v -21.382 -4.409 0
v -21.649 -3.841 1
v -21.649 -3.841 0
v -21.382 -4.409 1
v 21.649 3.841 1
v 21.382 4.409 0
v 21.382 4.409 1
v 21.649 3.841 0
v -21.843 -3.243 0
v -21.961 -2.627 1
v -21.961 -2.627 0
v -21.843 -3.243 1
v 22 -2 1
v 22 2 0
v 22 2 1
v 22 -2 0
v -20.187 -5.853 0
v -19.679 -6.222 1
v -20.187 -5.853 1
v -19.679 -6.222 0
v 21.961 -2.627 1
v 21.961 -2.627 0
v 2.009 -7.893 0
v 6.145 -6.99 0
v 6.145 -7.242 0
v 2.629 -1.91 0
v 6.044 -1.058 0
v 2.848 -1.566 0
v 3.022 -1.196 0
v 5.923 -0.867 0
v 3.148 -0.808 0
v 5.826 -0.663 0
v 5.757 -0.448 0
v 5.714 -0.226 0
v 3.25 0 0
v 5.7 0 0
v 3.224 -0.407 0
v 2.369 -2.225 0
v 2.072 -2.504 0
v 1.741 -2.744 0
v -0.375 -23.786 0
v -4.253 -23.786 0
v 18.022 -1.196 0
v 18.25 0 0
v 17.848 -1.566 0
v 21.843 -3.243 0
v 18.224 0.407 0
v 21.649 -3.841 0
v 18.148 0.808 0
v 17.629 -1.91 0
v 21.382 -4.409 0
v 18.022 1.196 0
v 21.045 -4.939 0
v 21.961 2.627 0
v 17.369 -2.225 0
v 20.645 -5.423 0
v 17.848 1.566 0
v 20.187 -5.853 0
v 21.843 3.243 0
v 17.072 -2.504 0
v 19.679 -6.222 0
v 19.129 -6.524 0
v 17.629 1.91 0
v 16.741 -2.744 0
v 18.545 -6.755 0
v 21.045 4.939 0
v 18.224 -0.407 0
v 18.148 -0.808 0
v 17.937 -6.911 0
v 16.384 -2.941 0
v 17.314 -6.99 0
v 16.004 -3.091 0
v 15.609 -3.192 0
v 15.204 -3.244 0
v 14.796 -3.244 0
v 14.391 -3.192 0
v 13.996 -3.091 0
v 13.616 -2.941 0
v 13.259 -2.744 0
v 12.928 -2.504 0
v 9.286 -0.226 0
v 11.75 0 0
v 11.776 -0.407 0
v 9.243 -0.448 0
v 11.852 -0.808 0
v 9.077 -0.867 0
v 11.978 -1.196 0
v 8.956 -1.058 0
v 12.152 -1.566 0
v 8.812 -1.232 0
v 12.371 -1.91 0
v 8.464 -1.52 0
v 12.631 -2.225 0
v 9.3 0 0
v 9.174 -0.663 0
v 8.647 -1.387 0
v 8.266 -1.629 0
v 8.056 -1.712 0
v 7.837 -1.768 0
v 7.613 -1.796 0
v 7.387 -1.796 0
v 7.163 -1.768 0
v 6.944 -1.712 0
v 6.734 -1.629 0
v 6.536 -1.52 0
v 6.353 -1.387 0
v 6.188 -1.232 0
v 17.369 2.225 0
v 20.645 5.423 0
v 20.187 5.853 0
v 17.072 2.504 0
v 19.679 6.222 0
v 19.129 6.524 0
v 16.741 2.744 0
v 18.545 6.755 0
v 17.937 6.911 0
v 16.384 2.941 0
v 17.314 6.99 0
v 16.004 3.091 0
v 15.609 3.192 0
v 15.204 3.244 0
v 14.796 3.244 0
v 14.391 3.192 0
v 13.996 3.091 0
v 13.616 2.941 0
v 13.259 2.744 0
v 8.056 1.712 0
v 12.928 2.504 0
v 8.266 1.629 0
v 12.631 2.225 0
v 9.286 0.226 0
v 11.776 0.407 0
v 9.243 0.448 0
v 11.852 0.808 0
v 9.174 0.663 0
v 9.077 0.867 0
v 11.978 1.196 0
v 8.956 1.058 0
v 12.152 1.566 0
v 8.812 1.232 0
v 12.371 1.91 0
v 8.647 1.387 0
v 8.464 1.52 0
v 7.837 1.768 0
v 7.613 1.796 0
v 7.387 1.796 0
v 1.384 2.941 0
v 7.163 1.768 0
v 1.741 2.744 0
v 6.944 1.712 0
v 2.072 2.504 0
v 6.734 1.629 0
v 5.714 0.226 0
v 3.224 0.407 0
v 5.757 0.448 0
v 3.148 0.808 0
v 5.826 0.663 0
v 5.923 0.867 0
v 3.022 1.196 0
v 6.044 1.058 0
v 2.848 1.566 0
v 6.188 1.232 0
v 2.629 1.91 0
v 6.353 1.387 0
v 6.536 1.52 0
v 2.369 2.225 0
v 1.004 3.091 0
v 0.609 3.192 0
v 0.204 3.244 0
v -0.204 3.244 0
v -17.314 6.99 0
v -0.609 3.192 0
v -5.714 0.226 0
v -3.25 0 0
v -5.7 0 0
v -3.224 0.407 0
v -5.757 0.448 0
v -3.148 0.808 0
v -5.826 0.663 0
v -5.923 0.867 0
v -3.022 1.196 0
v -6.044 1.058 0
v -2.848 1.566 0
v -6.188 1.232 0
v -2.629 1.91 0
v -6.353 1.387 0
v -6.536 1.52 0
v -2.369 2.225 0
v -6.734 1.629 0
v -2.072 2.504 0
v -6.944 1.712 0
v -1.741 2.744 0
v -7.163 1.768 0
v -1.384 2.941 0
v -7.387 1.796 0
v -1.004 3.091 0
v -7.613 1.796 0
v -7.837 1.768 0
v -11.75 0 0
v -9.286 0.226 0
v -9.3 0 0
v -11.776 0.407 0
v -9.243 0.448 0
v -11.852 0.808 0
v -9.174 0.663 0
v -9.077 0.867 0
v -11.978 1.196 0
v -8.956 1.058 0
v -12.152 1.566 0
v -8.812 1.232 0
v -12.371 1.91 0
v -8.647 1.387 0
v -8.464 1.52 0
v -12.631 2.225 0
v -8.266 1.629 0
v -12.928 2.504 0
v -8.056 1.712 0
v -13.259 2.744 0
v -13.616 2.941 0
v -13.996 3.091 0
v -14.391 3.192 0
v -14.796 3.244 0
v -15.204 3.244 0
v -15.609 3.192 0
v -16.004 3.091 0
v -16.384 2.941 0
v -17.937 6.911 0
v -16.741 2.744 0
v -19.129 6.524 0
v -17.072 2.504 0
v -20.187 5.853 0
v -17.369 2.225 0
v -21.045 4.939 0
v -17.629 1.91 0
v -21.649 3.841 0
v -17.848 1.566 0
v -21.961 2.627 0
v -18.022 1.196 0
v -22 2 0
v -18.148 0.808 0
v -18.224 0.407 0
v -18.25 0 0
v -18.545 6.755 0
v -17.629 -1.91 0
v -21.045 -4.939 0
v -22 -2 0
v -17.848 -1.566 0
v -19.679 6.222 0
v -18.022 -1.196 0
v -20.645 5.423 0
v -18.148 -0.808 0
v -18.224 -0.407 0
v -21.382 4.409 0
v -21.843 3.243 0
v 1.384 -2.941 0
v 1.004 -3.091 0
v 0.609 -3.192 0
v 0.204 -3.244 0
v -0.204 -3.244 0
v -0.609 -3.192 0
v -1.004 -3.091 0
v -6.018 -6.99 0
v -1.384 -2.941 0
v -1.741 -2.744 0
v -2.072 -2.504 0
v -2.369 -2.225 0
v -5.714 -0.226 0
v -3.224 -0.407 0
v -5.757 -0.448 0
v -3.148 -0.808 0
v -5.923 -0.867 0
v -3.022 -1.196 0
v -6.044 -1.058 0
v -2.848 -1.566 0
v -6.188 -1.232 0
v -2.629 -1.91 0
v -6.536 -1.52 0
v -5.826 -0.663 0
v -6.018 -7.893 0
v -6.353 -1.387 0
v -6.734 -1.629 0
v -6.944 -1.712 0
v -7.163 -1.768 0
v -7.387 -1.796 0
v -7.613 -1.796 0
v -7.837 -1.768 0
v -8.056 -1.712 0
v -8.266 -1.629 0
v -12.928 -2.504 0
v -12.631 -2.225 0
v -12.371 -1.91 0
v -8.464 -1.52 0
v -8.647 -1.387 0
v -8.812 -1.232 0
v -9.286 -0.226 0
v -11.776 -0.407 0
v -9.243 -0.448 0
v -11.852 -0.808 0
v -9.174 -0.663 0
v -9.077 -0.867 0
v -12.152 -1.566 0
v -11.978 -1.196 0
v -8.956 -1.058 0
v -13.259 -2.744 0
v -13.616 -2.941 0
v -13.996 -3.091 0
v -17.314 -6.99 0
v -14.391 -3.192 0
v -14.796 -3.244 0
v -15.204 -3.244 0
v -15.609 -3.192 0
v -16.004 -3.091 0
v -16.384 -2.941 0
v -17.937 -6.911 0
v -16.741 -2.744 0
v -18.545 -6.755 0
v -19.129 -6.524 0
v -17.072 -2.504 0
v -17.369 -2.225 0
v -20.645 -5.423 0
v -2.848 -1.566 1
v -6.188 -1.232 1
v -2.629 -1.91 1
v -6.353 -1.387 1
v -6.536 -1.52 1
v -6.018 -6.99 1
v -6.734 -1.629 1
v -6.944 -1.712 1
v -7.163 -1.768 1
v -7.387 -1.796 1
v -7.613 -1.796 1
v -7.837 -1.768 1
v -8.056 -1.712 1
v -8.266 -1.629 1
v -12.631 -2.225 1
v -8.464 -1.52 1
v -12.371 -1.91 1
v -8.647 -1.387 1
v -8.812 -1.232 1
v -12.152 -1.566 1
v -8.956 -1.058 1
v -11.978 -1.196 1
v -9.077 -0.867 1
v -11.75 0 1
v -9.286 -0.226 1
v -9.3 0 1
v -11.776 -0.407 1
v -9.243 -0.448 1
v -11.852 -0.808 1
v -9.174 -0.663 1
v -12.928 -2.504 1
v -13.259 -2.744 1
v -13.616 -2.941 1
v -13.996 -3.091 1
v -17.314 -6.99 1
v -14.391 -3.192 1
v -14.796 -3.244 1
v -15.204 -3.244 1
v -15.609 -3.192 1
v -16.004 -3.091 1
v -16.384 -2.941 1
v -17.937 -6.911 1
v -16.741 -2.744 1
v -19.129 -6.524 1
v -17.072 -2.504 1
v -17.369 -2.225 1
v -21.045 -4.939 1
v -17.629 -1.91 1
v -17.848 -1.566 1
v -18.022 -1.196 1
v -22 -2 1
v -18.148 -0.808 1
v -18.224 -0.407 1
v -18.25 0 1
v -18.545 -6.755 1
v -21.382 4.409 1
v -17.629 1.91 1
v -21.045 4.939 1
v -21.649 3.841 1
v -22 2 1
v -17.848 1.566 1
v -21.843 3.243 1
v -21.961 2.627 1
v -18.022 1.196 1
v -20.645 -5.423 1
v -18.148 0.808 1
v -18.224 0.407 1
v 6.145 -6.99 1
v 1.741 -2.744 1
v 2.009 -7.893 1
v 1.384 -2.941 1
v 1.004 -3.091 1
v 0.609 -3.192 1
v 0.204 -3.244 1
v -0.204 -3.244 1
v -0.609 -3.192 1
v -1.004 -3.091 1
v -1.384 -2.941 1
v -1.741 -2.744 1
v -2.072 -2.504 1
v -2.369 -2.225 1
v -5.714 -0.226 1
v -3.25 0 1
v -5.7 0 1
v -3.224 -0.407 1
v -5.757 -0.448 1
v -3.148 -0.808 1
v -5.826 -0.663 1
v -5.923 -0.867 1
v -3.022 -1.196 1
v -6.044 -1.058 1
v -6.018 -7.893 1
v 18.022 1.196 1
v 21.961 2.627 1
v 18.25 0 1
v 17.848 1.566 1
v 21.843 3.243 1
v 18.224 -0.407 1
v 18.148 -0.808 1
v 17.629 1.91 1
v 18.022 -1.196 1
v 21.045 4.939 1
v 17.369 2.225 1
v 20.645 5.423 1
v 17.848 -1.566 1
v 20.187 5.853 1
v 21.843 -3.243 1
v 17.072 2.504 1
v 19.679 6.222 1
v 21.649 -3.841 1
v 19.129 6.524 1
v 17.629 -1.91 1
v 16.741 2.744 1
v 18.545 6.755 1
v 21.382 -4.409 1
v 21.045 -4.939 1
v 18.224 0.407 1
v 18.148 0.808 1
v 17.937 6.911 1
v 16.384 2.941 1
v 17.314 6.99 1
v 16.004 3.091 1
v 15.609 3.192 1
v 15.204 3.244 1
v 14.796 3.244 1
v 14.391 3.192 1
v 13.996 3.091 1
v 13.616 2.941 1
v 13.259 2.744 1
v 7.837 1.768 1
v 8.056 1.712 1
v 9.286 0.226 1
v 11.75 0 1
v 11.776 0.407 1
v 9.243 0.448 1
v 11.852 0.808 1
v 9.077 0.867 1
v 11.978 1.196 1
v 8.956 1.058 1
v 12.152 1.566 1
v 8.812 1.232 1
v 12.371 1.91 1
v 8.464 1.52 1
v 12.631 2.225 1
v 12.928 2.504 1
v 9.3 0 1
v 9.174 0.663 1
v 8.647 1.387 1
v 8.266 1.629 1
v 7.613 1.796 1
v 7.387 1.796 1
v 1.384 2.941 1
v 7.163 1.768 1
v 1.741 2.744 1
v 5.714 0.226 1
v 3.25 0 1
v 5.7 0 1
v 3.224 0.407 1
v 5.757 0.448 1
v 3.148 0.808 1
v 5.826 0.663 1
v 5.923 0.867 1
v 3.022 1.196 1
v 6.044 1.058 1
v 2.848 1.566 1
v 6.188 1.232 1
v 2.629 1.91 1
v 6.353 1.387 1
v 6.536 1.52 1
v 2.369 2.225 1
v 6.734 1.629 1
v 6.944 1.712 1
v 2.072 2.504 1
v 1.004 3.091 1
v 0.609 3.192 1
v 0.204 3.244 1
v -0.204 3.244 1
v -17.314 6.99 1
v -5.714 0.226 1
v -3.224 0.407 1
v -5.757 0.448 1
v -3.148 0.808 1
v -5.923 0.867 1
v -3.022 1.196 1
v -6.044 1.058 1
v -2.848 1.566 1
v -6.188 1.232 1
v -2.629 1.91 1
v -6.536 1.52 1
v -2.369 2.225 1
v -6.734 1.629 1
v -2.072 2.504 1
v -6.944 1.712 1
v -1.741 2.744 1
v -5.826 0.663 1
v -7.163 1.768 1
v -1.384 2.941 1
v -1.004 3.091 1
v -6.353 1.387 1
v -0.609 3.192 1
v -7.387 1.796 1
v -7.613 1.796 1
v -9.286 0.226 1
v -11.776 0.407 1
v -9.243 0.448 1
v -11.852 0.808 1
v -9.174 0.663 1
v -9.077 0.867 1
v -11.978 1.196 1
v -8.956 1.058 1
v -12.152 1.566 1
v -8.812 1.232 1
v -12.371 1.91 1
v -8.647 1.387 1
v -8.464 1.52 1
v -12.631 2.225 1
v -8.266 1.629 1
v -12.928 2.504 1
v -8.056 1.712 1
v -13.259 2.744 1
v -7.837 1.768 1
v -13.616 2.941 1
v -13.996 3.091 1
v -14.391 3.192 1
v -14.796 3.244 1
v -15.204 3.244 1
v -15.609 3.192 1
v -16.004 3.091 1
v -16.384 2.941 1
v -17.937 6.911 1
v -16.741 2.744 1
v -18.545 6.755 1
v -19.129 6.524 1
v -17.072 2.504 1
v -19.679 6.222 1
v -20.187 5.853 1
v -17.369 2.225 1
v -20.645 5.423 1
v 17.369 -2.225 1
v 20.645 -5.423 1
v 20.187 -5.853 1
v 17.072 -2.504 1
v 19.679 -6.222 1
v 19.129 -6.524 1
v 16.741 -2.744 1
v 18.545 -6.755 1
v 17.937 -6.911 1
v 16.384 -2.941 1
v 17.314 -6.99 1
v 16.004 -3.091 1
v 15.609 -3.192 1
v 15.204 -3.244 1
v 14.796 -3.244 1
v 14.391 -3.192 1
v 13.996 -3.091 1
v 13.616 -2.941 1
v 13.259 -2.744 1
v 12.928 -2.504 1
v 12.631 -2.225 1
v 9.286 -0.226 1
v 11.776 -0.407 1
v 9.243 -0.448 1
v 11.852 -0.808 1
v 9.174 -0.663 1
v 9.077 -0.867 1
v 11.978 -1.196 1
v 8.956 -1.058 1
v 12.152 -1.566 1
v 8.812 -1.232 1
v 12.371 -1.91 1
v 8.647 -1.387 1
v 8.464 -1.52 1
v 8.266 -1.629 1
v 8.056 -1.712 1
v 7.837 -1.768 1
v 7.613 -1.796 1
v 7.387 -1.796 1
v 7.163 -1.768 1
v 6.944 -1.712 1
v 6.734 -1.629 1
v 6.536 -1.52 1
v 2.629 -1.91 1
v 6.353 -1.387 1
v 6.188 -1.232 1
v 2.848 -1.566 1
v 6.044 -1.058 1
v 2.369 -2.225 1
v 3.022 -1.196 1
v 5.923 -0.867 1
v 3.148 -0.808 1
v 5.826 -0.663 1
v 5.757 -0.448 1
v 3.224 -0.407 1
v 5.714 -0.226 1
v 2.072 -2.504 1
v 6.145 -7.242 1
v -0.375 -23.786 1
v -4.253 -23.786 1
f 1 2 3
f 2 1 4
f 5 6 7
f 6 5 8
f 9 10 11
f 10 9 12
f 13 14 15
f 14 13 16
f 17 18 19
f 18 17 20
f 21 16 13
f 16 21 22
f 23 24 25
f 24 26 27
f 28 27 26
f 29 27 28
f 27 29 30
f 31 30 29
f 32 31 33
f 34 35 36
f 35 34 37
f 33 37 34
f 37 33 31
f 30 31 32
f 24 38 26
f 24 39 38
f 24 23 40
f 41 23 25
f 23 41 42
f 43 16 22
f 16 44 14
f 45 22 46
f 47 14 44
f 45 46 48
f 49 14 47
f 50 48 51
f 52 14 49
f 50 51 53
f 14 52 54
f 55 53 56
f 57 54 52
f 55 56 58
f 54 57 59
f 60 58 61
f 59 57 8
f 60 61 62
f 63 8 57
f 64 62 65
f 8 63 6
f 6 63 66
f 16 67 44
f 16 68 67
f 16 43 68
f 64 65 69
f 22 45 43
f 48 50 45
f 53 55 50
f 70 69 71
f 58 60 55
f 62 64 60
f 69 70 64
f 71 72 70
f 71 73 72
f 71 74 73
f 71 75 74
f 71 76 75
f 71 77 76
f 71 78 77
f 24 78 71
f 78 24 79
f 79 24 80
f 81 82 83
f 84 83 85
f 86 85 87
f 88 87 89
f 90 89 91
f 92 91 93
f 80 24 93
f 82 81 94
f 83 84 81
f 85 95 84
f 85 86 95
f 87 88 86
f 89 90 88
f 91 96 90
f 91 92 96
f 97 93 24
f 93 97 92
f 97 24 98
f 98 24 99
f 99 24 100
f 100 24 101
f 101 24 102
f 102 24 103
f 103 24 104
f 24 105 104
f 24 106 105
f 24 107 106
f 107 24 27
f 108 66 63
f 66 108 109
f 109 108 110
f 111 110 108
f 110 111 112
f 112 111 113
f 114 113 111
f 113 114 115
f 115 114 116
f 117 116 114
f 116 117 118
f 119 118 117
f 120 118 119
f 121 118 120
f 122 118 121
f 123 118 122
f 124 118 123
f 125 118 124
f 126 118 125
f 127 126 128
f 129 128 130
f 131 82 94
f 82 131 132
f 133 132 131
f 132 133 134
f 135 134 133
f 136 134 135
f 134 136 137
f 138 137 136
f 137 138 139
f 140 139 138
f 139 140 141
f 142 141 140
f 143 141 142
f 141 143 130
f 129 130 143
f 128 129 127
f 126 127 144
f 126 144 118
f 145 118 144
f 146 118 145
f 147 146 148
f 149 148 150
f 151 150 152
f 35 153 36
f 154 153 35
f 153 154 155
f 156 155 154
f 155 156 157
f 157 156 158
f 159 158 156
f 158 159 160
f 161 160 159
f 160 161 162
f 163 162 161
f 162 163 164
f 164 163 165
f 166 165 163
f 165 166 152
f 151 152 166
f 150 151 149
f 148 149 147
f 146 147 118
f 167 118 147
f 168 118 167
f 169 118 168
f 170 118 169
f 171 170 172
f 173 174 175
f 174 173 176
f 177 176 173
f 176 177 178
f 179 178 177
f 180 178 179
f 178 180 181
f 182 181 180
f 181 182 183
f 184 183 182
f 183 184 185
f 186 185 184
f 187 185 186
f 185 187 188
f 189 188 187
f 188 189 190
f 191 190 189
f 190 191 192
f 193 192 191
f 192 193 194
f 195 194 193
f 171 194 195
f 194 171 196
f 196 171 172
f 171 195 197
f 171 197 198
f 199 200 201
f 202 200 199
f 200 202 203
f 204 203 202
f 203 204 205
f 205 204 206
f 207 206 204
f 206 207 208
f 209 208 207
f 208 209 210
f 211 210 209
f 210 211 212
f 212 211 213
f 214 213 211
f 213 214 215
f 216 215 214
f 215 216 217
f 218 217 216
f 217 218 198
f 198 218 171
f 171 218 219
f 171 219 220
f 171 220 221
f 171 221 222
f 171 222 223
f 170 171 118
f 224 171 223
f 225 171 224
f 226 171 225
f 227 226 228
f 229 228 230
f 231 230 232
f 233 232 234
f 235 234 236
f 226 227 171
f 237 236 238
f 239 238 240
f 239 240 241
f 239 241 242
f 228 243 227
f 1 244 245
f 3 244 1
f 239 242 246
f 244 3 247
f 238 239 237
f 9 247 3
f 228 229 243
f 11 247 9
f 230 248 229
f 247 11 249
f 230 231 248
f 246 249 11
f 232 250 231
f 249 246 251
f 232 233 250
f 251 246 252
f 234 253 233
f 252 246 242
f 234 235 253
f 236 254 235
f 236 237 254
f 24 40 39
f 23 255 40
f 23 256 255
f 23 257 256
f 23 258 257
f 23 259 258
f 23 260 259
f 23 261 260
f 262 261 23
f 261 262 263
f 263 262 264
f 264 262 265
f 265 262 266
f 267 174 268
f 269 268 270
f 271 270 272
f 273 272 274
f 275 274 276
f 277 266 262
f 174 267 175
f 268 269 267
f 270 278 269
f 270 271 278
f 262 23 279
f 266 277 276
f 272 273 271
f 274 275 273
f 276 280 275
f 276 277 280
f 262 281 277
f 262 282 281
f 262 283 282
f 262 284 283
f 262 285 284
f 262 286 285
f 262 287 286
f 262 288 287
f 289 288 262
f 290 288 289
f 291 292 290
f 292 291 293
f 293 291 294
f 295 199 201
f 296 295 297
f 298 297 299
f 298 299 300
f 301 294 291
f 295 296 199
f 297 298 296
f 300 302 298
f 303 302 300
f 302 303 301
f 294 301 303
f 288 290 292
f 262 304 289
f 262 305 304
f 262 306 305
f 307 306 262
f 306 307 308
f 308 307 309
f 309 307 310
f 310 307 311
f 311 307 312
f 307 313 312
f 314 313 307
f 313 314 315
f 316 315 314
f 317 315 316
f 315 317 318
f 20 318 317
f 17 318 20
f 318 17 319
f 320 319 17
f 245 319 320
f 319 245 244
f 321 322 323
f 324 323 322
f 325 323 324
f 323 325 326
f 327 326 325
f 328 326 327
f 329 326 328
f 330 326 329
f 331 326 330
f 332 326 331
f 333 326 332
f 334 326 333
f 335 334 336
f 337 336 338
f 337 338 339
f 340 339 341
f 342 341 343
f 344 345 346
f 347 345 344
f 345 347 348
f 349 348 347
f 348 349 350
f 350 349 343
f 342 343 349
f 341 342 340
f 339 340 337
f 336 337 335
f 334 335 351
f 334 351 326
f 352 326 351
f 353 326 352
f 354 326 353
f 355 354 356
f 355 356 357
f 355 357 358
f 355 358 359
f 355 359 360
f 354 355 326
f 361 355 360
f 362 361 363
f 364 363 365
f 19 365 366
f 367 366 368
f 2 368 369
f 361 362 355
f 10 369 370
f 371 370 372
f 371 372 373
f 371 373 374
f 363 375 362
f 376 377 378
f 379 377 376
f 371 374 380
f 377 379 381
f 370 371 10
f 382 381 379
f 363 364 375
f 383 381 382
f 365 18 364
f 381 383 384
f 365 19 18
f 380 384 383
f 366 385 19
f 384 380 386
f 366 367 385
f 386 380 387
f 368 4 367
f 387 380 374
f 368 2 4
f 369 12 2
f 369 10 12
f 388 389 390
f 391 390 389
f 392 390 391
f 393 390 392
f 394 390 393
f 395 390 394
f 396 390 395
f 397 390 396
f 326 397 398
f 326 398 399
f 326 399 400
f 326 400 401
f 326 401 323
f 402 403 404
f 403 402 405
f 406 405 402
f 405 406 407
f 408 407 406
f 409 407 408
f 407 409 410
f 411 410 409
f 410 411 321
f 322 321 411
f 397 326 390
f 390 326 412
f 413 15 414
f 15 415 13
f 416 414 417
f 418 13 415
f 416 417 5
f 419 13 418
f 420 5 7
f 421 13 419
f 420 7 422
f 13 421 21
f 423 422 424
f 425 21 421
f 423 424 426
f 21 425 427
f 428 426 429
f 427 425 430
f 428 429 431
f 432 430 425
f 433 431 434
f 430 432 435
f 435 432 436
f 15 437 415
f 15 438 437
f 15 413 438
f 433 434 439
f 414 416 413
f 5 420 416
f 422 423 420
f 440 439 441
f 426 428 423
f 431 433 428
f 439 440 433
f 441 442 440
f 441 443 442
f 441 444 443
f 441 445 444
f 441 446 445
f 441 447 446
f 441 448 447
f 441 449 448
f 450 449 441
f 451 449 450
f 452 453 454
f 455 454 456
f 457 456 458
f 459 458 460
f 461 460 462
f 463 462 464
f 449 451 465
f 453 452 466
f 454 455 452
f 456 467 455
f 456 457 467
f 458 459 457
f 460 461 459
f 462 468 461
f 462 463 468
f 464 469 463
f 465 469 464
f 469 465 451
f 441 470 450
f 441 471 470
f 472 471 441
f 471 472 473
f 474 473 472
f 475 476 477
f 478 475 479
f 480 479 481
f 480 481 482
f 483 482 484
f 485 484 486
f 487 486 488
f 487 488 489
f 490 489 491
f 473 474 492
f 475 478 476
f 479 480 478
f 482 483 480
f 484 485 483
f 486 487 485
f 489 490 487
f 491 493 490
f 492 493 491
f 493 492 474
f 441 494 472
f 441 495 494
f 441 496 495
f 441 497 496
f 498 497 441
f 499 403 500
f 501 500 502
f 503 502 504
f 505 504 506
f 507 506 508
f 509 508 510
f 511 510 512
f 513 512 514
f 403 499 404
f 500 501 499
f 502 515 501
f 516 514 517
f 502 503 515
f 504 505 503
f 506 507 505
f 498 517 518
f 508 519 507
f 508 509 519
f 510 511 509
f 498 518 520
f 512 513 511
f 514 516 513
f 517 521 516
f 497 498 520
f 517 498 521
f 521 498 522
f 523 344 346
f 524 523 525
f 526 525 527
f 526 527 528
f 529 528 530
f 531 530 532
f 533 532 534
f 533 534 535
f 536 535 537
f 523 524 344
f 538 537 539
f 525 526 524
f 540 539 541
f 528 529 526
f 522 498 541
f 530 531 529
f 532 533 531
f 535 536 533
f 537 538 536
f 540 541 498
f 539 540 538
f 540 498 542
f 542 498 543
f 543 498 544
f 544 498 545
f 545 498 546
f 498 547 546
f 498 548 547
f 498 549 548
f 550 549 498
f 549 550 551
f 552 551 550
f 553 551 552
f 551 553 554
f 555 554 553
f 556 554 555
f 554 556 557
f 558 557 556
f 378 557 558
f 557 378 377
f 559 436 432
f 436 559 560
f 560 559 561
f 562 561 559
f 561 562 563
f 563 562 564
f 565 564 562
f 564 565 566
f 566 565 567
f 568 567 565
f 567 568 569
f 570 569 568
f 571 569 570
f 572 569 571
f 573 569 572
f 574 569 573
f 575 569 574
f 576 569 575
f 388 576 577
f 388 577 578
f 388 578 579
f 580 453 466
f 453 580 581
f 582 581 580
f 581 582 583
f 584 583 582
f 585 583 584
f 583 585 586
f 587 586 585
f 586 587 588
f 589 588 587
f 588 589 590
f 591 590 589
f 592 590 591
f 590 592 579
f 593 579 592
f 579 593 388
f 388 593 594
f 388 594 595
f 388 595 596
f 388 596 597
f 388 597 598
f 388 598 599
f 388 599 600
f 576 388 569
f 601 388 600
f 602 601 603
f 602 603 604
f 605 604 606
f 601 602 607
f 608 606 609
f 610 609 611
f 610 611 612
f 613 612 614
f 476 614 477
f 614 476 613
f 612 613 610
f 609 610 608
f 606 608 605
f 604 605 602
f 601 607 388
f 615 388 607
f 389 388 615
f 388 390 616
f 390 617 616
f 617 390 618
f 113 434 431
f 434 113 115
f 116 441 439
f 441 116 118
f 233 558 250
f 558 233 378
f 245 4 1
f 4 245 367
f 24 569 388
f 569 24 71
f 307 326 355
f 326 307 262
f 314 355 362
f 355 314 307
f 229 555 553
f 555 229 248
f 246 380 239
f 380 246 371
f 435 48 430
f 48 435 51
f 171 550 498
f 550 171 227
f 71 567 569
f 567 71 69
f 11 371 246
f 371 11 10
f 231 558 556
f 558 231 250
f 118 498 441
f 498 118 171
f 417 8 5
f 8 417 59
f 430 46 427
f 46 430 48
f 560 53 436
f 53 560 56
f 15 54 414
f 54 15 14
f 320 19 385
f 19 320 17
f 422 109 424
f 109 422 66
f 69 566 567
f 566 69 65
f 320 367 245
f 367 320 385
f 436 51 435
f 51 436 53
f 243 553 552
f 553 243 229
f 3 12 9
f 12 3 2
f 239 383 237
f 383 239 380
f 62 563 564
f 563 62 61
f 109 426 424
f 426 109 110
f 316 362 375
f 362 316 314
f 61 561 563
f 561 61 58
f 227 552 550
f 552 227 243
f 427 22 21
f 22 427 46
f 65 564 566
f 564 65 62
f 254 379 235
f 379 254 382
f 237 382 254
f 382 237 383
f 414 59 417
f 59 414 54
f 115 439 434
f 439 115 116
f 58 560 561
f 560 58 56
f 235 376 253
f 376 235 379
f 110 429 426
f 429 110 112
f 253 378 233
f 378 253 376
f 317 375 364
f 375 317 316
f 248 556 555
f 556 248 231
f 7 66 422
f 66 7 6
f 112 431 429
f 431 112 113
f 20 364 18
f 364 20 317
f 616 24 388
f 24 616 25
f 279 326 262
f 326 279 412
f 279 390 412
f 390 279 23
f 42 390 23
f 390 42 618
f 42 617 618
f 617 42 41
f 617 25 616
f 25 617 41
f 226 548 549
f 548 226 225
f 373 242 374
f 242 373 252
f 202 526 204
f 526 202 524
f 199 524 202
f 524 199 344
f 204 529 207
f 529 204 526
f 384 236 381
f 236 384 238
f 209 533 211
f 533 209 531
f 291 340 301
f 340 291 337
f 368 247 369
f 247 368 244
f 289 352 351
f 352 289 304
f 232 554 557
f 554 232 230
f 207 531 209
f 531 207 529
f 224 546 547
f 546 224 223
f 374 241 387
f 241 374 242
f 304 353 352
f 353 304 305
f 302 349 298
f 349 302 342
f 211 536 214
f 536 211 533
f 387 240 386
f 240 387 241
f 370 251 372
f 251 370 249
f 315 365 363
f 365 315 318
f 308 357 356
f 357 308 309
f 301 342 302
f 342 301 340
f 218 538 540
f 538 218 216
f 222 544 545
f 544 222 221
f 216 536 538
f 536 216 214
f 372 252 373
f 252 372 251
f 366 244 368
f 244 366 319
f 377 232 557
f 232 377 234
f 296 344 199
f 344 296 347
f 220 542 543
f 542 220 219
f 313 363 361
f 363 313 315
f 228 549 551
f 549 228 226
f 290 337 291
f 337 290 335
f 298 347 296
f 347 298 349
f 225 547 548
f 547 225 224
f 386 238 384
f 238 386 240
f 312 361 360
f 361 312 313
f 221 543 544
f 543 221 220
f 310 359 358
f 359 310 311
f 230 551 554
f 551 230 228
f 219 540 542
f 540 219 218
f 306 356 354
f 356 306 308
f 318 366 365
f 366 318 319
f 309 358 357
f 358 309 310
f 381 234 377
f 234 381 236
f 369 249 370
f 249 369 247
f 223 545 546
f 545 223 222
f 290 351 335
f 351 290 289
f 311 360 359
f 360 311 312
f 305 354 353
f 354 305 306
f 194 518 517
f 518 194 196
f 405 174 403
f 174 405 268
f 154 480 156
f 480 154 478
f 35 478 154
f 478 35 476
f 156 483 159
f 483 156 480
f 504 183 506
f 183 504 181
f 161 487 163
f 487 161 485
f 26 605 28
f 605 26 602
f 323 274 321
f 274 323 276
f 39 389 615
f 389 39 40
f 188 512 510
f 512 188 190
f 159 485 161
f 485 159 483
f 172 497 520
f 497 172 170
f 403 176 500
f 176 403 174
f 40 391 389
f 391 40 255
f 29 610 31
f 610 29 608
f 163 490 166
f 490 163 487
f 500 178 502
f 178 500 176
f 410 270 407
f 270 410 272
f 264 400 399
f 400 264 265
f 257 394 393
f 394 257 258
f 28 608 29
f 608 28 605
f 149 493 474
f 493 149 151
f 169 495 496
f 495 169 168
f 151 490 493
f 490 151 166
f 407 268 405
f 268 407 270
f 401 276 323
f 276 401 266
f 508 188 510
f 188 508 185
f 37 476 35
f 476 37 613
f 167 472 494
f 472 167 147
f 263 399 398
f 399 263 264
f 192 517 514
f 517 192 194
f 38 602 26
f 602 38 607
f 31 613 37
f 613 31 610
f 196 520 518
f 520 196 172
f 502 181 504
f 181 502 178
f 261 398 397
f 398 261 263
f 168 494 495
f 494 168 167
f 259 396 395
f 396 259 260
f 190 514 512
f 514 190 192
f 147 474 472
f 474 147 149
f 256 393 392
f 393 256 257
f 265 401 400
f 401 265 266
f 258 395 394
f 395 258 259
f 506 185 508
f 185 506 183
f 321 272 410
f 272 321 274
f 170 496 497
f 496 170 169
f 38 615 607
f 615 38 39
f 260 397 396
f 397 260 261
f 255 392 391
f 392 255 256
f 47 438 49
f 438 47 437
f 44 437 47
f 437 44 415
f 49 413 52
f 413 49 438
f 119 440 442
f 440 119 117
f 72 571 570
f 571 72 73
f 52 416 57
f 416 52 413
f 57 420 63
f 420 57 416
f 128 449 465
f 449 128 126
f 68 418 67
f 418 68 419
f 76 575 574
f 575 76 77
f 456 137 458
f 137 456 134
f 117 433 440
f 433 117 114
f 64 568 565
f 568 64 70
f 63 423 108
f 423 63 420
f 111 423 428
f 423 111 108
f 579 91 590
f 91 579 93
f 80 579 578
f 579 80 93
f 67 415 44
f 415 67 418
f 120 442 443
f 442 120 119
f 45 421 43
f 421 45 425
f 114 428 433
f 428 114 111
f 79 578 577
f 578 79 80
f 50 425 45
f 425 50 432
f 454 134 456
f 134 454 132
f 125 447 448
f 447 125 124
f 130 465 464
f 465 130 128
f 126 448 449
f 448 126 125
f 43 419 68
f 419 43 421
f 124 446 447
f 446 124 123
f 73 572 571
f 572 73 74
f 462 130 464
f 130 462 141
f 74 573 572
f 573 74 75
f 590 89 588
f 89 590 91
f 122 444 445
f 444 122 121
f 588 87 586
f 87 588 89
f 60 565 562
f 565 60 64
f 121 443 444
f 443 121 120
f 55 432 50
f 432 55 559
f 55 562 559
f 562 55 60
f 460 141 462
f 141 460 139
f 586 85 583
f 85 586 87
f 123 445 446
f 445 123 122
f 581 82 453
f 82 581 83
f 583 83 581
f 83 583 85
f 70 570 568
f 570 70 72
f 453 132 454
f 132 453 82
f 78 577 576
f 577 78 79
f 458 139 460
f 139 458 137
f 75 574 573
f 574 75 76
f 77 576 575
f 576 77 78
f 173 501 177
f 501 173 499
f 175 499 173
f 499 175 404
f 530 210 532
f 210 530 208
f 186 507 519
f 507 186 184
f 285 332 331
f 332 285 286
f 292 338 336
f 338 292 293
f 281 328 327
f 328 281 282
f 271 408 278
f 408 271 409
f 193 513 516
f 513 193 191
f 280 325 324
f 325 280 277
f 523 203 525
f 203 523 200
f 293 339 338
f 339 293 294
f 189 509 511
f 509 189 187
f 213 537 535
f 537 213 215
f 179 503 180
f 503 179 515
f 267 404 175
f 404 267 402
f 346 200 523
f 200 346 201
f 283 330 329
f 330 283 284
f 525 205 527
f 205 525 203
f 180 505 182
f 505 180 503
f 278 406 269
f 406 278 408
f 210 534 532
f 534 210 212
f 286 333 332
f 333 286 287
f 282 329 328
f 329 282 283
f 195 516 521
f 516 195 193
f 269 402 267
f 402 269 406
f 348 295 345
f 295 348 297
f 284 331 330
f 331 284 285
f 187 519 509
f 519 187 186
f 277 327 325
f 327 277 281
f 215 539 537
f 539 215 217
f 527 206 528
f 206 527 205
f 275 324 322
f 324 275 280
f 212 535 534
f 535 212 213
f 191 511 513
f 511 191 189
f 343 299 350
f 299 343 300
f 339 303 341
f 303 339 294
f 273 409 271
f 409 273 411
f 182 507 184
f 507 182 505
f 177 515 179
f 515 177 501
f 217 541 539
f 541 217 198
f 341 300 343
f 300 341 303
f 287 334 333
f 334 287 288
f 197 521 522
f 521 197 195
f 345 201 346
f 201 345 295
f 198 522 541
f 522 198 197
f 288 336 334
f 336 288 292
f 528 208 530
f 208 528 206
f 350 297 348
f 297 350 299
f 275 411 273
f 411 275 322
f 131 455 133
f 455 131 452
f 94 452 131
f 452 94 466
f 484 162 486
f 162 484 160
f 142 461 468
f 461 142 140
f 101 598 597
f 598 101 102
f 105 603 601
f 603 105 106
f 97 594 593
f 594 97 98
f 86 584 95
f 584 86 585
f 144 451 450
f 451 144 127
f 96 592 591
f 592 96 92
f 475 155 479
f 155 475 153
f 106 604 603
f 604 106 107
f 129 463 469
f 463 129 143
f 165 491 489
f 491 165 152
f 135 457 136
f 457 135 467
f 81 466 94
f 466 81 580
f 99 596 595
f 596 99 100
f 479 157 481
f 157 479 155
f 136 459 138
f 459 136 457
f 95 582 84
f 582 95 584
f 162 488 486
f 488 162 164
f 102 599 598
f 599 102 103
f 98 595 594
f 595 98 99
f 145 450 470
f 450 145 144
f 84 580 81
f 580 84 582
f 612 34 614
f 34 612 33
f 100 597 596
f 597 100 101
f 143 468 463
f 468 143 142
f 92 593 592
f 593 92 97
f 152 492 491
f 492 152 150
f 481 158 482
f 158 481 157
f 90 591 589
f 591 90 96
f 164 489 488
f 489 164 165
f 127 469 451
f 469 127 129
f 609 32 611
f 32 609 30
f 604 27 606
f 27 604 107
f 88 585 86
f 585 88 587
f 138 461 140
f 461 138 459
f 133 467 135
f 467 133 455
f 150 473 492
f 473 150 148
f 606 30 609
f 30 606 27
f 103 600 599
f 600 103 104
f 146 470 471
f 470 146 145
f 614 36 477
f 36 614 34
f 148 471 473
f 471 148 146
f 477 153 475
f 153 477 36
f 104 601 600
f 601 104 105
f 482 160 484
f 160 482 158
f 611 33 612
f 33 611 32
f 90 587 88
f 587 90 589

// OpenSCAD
$fn = 50;


difference() {
	union() {
		*color(alpha = 1.0000000000, c = "gray") {
			translate(v = [0, 14, 0]) {
				linear_extrude(height = 1) {
					text(font = "Arial:style=Bold", halign = "center", size = 4.5000000000, text = "COMMENT description oobb_plate_shape_p_type_1_depth_3_width_1_thickness_7_extra_oobb_size", valign = "center");
				}
			}
		}
		hull() {
			translate(v = [-17.0000000000, 2.0000000000, 0]) {
				cylinder(h = 1, r = 5);
			}
			translate(v = [17.0000000000, 2.0000000000, 0]) {
				cylinder(h = 1, r = 5);
			}
			translate(v = [-17.0000000000, -2.0000000000, 0]) {
				cylinder(h = 1, r = 5);
			}
			translate(v = [17.0000000000, -2.0000000000, 0]) {
				cylinder(h = 1, r = 5);
			}
		}
		translate(v = [0, -5, 0]) {
			linear_extrude(height = 1) {
				text(font = "DejaVu Sans Mono:style=Bold", halign = "center", size = 19.0000000000, text = "7", valign = "top");
			}
		}
	}
	union() {
		*color(alpha = 1.0000000000, c = "gray") {
			translate(v = [0, 14, 0]) {
				linear_extrude(height = 1) {
					text(font = "Arial:style=Bold", halign = "center", size = 4.5000000000, text = "COMMENT description oobb_holes_shape_n_type_3_width_1_thickness_7_extra_oobb_size_1_height_'all'_holes_true_both_holes", valign = "center");
				}
			}
		}
		translate(v = [-15.0000000000, 0.0000000000, 0]) {
			translate(v = [0, 0, -50]) {
				cylinder(h = 100, r = 3.2500000000);
			}
		}
		translate(v = [0, 0, -50]) {
			cylinder(h = 100, r = 3.2500000000);
		}
		translate(v = [15.0000000000, 0.0000000000, 0]) {
			translate(v = [0, 0, -50]) {
				cylinder(h = 100, r = 3.2500000000);
			}
		}
		translate(v = [-15.0000000000, 0.0000000000, 0]) {
			translate(v = [0, 0, -50]) {
				cylinder(h = 100, r = 1.8000000000);
			}
		}
		translate(v = [-7.5000000000, 0.0000000000, 0]) {
			translate(v = [0, 0, -50]) {
				cylinder(h = 100, r = 1.8000000000);
			}
		}
		translate(v = [0, 0, -50]) {
			cylinder(h = 100, r = 1.8000000000);
		}
		translate(v = [7.5000000000, 0.0000000000, 0]) {
			translate(v = [0, 0, -50]) {
				cylinder(h = 100, r = 1.8000000000);
			}
		}
		translate(v = [15.0000000000, 0.0000000000, 0]) {
			translate(v = [0, 0, -50]) {
				cylinder(h = 100, r = 1.8000000000);
			}
		}
	}
}
